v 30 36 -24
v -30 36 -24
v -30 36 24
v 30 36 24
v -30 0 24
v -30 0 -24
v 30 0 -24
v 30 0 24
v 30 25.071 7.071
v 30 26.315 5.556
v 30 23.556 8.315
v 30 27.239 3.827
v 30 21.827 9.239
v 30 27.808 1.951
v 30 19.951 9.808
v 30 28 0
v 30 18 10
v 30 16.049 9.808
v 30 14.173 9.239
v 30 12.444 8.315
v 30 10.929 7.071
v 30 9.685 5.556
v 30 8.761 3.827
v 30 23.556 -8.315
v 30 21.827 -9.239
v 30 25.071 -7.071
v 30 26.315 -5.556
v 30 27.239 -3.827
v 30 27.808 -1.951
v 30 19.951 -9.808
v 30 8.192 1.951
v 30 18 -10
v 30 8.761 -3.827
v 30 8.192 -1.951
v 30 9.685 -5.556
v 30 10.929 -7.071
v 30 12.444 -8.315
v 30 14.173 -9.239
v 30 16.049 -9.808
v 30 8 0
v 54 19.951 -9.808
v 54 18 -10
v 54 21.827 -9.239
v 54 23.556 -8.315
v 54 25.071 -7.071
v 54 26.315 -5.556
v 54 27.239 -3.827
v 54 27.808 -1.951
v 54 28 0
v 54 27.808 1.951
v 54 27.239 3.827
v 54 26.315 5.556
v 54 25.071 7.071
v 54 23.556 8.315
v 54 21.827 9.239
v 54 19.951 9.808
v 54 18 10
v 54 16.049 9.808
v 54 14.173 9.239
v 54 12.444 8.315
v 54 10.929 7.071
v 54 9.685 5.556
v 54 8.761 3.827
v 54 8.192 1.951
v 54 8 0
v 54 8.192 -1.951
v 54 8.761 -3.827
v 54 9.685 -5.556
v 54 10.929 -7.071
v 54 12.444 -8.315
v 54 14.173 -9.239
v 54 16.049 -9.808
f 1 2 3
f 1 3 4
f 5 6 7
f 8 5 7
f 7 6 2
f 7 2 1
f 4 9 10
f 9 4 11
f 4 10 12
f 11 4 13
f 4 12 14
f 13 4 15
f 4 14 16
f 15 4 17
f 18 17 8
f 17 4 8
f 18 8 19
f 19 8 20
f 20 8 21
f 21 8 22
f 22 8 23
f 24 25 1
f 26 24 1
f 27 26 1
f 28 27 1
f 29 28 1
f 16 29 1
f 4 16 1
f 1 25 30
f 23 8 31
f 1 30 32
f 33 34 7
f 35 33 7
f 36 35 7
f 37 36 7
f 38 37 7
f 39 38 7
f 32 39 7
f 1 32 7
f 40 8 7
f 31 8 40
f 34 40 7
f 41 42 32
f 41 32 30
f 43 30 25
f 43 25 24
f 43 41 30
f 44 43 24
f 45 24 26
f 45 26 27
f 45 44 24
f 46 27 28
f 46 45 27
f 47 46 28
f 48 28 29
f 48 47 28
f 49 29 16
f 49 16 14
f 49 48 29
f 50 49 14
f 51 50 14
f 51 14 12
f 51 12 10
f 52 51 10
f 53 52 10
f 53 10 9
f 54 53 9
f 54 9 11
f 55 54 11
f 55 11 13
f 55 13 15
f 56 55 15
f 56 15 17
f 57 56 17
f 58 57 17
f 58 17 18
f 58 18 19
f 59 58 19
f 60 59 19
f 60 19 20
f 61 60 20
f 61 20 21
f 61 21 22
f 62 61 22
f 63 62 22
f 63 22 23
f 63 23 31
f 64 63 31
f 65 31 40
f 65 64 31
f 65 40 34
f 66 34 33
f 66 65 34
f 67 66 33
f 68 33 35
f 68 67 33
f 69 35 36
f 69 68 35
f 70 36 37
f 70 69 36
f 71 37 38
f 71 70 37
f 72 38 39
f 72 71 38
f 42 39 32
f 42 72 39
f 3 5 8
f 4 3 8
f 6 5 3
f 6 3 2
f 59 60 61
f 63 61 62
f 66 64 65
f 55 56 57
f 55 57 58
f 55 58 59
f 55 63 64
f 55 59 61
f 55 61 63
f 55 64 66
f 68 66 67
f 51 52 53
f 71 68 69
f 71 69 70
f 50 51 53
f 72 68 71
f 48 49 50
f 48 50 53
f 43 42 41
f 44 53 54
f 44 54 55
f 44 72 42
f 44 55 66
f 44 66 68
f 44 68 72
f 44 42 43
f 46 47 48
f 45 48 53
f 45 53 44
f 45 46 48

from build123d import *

# Parameters (mm, degrees)
SKETCH_1_W      = 60
SKETCH_1_H      = 48
EXTRUDE_1_DEPTH = 36
EXTRUDE_2_REACH = 96.488
SKETCH_2_R      = 10


with BuildPart() as part:
    # 草图1 → 凸台-拉伸1 (new body)
    with BuildSketch(Plane(origin=(0, 0, 0), x_dir=(1, 0, 0), z_dir=(0, 1, 0))):
        Rectangle(SKETCH_1_W, SKETCH_1_H)
    extrude(amount=EXTRUDE_1_DEPTH)

    # 草图2 → 凸台-拉伸2 (add, up to next)
    with BuildSketch(Plane(origin=(54, 0, 0), x_dir=(0, 0, -1), z_dir=(1, 0, 0)), mode=Mode.PRIVATE) as extrude_2_sk1:
        with Locations((0, 18)):
            Circle(SKETCH_2_R)
    extrude_2_tool1 = extrude(extrude_2_sk1.sketch, amount=-EXTRUDE_2_REACH, mode=Mode.PRIVATE) - part.part
    add(extrude_2_tool1.solids().sort_by_distance((54, 18, 0))[0])


solid = part.part
